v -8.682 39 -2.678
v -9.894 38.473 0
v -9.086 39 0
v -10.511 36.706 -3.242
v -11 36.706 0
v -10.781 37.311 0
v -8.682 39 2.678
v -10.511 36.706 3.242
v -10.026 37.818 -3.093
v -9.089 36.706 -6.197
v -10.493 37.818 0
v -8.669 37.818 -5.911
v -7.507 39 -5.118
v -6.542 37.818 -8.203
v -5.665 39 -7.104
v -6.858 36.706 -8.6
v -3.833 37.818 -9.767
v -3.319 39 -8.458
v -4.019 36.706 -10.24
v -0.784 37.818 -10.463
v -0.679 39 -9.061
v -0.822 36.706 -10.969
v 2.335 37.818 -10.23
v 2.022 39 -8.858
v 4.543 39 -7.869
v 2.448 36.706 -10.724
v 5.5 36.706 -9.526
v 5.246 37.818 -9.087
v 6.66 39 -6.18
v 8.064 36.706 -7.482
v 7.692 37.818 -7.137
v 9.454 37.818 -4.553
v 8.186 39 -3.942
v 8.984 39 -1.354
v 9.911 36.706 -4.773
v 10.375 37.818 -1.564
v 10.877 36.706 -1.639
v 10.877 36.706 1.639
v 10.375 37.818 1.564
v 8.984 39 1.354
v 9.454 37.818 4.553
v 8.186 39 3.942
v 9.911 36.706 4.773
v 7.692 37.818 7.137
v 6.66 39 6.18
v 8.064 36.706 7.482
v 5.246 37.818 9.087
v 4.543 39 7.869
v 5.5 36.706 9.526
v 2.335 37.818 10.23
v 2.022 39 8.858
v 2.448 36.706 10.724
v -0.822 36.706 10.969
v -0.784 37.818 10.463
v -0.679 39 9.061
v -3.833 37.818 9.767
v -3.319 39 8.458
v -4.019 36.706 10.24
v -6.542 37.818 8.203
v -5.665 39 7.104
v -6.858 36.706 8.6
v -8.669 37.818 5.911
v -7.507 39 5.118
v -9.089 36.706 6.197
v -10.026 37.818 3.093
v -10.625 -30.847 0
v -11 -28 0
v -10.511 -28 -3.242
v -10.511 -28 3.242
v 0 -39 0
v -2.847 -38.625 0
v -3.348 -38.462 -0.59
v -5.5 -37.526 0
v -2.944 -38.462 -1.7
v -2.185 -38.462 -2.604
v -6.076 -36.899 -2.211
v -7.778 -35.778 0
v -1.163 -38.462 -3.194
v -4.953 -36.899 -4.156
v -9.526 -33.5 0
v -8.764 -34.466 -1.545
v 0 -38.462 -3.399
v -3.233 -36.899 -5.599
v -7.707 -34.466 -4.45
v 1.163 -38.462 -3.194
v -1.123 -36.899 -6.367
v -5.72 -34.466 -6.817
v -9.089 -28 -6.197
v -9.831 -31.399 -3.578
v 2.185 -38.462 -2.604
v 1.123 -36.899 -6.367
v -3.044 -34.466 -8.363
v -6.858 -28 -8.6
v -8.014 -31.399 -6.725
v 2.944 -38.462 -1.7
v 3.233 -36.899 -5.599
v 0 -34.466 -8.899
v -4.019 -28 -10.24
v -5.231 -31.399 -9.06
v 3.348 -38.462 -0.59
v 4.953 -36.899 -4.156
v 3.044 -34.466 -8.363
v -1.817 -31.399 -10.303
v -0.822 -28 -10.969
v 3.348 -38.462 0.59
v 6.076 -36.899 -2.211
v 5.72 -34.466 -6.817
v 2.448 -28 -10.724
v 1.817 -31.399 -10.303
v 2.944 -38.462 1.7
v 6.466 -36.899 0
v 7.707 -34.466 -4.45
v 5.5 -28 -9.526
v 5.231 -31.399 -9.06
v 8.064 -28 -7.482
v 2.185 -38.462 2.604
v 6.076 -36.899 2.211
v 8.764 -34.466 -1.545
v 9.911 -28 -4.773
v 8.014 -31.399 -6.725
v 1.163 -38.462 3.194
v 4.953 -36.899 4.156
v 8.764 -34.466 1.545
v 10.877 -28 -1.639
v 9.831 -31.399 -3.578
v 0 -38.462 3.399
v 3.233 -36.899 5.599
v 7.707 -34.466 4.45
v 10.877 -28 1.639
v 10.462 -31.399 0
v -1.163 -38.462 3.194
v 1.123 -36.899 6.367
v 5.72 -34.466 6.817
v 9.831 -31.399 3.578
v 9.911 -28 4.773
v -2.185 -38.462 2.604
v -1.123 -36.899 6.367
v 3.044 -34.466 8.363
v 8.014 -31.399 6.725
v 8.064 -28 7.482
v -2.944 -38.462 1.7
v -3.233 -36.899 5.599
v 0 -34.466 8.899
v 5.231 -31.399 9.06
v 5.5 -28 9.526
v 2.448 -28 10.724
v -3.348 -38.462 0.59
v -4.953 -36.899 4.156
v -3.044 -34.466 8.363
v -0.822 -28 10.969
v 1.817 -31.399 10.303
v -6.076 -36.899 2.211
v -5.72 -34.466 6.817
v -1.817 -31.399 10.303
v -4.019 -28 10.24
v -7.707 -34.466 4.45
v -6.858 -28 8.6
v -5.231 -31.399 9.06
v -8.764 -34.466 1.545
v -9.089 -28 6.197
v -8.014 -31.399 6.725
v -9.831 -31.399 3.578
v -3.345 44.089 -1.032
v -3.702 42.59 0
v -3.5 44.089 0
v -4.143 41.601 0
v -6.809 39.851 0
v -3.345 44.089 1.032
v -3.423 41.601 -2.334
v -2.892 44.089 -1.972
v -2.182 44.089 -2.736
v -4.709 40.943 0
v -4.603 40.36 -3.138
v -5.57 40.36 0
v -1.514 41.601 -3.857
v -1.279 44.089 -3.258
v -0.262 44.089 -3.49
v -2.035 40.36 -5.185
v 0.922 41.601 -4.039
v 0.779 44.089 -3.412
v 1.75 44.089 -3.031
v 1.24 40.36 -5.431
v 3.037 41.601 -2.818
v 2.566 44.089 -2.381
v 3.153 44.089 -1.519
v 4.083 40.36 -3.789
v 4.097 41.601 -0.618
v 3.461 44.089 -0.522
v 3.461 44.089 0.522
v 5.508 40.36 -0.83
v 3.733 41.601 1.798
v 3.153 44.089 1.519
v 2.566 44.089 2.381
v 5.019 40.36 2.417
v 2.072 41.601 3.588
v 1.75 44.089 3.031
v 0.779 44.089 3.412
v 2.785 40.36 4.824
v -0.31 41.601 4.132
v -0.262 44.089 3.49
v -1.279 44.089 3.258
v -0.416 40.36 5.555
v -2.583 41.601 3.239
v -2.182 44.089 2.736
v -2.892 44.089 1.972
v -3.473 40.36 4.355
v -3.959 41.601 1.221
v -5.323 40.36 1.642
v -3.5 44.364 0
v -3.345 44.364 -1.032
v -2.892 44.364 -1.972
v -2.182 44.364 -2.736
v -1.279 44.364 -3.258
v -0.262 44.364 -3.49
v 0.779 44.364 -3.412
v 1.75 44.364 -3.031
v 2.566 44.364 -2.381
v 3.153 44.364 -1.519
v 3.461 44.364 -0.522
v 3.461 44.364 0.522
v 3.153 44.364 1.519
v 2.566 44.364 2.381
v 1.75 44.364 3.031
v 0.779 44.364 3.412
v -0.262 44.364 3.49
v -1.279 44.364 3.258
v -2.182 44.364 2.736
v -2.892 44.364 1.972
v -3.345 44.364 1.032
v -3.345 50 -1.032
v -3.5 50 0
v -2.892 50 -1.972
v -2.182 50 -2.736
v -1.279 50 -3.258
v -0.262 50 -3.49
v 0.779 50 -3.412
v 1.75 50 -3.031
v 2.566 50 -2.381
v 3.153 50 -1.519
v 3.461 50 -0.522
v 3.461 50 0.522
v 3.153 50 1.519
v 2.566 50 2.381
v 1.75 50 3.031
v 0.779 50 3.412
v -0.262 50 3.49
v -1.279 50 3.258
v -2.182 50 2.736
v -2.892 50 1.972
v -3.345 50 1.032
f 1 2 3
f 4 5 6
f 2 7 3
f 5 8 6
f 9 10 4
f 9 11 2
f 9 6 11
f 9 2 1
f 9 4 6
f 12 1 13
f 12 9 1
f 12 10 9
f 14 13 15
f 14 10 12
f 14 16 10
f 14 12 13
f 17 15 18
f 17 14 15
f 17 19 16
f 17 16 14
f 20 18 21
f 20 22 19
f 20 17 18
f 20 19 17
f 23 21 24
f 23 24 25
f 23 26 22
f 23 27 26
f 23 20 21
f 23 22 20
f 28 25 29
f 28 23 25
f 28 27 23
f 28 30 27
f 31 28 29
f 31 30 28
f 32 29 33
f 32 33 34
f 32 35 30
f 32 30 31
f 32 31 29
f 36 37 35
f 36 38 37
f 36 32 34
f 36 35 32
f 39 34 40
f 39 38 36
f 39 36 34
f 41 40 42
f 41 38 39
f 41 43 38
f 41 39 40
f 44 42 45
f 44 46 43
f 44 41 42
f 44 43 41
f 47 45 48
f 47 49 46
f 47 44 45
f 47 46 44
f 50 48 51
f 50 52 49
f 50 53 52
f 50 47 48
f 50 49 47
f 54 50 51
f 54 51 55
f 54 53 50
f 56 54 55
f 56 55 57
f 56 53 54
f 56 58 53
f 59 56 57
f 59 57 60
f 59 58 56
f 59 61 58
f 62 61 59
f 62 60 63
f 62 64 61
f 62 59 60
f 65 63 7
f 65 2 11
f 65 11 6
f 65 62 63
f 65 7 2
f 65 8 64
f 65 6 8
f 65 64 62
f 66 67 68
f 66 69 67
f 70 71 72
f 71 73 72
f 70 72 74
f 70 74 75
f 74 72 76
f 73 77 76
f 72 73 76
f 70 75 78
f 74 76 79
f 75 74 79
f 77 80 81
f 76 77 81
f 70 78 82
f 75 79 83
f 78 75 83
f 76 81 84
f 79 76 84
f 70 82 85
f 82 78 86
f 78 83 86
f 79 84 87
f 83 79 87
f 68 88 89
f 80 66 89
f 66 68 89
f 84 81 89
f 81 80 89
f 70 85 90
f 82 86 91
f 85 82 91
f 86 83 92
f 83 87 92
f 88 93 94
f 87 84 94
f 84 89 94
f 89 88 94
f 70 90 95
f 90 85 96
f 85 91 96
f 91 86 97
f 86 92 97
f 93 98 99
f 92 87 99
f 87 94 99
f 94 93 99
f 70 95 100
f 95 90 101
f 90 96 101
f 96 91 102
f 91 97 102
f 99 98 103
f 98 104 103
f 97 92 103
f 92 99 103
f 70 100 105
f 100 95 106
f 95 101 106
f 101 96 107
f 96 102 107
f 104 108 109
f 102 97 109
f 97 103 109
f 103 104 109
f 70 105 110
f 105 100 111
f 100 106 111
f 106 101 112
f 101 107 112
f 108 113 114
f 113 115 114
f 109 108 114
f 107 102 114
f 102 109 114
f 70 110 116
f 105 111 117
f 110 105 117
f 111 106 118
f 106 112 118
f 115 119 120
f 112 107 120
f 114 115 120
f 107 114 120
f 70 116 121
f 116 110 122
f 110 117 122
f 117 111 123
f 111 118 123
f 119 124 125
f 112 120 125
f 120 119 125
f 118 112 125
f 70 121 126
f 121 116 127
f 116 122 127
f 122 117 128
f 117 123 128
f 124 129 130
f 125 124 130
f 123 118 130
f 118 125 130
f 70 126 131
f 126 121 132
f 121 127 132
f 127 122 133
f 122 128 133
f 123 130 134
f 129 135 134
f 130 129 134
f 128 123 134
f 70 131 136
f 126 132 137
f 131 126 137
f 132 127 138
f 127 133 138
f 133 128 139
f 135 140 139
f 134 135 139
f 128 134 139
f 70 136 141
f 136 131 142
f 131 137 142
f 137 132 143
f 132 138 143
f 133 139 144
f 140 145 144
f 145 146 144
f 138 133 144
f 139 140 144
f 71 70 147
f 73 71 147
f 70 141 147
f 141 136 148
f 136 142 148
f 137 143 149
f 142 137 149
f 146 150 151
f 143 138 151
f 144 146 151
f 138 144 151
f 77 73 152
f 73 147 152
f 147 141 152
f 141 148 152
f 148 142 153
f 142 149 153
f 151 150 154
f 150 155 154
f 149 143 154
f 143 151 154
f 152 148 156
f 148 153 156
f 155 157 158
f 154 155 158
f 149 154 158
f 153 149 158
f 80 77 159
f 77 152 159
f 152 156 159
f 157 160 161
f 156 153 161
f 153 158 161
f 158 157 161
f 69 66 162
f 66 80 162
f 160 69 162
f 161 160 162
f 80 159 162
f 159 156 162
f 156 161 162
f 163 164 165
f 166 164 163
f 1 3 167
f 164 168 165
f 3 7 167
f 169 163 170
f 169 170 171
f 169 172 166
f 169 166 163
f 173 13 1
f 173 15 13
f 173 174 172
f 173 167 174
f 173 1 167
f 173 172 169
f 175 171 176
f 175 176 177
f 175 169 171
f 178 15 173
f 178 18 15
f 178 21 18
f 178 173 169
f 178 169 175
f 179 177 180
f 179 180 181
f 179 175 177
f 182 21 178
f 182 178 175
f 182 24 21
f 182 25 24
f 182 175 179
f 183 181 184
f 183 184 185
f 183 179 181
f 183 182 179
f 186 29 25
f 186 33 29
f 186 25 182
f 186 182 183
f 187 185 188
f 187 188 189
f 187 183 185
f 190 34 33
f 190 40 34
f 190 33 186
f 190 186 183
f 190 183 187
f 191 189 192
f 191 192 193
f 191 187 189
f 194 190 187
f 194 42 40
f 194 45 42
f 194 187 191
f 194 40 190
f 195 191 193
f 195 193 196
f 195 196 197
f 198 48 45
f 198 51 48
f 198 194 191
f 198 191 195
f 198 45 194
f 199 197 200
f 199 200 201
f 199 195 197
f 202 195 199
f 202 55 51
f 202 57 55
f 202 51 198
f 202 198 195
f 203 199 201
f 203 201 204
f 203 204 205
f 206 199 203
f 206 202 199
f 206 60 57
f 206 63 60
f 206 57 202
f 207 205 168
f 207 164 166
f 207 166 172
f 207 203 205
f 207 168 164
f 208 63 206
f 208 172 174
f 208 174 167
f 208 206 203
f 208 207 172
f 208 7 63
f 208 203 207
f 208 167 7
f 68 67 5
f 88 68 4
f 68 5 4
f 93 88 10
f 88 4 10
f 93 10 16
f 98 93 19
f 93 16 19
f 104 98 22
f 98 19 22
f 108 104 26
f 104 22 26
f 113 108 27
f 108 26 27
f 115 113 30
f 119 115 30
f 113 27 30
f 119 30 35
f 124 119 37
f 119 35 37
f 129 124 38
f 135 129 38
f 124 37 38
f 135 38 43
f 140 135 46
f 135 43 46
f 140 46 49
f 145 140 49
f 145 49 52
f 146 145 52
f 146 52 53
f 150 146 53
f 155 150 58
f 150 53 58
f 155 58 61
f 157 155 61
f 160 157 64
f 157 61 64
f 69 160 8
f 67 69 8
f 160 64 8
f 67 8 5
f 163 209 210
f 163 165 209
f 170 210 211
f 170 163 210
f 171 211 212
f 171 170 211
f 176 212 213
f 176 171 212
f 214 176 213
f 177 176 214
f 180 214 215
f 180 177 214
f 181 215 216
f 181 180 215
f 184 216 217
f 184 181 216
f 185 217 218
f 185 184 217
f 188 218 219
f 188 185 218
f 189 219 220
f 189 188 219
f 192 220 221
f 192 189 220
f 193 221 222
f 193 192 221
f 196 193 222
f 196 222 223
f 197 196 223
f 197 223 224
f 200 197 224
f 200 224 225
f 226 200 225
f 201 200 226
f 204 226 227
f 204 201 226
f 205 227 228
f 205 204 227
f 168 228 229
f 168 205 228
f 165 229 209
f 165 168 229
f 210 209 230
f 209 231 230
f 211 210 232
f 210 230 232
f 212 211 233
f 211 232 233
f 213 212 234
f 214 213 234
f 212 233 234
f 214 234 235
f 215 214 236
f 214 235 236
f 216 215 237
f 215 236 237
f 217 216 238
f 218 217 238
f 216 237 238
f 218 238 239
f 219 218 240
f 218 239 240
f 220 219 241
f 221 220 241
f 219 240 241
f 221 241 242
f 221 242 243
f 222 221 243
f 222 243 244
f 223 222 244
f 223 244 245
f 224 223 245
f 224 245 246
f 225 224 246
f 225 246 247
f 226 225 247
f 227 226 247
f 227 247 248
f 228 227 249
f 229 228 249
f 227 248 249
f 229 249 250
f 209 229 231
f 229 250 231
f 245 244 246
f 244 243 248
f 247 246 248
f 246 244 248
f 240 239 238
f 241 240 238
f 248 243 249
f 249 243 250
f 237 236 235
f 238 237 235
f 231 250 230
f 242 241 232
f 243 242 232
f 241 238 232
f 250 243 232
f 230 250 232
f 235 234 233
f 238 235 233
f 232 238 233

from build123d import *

# Parameters (mm, degrees)
SKETCH1_W = 3.5
SKETCH1_H = 11


with BuildPart() as part:
    # Sketch1 → Revolve1 (revolve)
    with BuildSketch(Plane.XY, mode=Mode.PRIVATE) as revolve1_sk:
        with BuildLine():
            Line((9.085974676, 39), (3.5, 39))
            Line((3.5, 39), (3.5, 28))
            Line((3.5, 28), (0, 28))
            Line((0, 28), (0, -39))
            ThreePointArc((0, -39), (7.778174593, -35.778174593), (11, -28))
            Line((11, -28), (11, 36.706189904))
            add(Edge.make_bspline(
                [(9.085974676, 39), (9.952667981, 38.554296202), (10.670284632, 37.900307222), (11, 36.706189904)],
                knots=[0.726528094, 0.726528094, 0.726528094, 0.726528094, 1, 1, 1, 1], degree=3))
        make_face()
        with BuildLine():
            Line((3.5, 44.089340843), (3.5, 39))
            Line((3.5, 39), (9.085974676, 39))
            add(Edge.make_bspline(
                [(3.5, 44.089340843), (3.569121253, 39.909476787), (6.831780935, 40.159236729), (9.085974676, 39)],
                knots=[0.015251506, 0.015251506, 0.015251506, 0.015251506, 0.726528094, 0.726528094, 0.726528094, 0.726528094], degree=3))
        make_face()
        with Locations((1.75, 33.5)):
            Rectangle(SKETCH1_W, SKETCH1_H)
        with BuildLine():
            Line((0, 50), (0, 39))
            Line((0, 39), (3.5, 39))
            Line((3.5, 39), (3.5, 44.089340843))
            add(Edge.make_bspline(
                [(3.5, 44.364387792), (3.498504063, 44.270630457), (3.498517872, 44.178967328), (3.5, 44.089340843)],
                knots=[0, 0, 0, 0, 0.015251506, 0.015251506, 0.015251506, 0.015251506], degree=3))
            Line((3.5, 44.364387792), (3.5, 50))
            Line((3.5, 50), (0, 50))
        make_face()
    revolve(revolve1_sk.sketch.rotate(Axis((0, 28, 0), (0, -1, 0)), 180), axis=Axis((0, 28, 0), (0, -1, 0)))


solid = part.part
